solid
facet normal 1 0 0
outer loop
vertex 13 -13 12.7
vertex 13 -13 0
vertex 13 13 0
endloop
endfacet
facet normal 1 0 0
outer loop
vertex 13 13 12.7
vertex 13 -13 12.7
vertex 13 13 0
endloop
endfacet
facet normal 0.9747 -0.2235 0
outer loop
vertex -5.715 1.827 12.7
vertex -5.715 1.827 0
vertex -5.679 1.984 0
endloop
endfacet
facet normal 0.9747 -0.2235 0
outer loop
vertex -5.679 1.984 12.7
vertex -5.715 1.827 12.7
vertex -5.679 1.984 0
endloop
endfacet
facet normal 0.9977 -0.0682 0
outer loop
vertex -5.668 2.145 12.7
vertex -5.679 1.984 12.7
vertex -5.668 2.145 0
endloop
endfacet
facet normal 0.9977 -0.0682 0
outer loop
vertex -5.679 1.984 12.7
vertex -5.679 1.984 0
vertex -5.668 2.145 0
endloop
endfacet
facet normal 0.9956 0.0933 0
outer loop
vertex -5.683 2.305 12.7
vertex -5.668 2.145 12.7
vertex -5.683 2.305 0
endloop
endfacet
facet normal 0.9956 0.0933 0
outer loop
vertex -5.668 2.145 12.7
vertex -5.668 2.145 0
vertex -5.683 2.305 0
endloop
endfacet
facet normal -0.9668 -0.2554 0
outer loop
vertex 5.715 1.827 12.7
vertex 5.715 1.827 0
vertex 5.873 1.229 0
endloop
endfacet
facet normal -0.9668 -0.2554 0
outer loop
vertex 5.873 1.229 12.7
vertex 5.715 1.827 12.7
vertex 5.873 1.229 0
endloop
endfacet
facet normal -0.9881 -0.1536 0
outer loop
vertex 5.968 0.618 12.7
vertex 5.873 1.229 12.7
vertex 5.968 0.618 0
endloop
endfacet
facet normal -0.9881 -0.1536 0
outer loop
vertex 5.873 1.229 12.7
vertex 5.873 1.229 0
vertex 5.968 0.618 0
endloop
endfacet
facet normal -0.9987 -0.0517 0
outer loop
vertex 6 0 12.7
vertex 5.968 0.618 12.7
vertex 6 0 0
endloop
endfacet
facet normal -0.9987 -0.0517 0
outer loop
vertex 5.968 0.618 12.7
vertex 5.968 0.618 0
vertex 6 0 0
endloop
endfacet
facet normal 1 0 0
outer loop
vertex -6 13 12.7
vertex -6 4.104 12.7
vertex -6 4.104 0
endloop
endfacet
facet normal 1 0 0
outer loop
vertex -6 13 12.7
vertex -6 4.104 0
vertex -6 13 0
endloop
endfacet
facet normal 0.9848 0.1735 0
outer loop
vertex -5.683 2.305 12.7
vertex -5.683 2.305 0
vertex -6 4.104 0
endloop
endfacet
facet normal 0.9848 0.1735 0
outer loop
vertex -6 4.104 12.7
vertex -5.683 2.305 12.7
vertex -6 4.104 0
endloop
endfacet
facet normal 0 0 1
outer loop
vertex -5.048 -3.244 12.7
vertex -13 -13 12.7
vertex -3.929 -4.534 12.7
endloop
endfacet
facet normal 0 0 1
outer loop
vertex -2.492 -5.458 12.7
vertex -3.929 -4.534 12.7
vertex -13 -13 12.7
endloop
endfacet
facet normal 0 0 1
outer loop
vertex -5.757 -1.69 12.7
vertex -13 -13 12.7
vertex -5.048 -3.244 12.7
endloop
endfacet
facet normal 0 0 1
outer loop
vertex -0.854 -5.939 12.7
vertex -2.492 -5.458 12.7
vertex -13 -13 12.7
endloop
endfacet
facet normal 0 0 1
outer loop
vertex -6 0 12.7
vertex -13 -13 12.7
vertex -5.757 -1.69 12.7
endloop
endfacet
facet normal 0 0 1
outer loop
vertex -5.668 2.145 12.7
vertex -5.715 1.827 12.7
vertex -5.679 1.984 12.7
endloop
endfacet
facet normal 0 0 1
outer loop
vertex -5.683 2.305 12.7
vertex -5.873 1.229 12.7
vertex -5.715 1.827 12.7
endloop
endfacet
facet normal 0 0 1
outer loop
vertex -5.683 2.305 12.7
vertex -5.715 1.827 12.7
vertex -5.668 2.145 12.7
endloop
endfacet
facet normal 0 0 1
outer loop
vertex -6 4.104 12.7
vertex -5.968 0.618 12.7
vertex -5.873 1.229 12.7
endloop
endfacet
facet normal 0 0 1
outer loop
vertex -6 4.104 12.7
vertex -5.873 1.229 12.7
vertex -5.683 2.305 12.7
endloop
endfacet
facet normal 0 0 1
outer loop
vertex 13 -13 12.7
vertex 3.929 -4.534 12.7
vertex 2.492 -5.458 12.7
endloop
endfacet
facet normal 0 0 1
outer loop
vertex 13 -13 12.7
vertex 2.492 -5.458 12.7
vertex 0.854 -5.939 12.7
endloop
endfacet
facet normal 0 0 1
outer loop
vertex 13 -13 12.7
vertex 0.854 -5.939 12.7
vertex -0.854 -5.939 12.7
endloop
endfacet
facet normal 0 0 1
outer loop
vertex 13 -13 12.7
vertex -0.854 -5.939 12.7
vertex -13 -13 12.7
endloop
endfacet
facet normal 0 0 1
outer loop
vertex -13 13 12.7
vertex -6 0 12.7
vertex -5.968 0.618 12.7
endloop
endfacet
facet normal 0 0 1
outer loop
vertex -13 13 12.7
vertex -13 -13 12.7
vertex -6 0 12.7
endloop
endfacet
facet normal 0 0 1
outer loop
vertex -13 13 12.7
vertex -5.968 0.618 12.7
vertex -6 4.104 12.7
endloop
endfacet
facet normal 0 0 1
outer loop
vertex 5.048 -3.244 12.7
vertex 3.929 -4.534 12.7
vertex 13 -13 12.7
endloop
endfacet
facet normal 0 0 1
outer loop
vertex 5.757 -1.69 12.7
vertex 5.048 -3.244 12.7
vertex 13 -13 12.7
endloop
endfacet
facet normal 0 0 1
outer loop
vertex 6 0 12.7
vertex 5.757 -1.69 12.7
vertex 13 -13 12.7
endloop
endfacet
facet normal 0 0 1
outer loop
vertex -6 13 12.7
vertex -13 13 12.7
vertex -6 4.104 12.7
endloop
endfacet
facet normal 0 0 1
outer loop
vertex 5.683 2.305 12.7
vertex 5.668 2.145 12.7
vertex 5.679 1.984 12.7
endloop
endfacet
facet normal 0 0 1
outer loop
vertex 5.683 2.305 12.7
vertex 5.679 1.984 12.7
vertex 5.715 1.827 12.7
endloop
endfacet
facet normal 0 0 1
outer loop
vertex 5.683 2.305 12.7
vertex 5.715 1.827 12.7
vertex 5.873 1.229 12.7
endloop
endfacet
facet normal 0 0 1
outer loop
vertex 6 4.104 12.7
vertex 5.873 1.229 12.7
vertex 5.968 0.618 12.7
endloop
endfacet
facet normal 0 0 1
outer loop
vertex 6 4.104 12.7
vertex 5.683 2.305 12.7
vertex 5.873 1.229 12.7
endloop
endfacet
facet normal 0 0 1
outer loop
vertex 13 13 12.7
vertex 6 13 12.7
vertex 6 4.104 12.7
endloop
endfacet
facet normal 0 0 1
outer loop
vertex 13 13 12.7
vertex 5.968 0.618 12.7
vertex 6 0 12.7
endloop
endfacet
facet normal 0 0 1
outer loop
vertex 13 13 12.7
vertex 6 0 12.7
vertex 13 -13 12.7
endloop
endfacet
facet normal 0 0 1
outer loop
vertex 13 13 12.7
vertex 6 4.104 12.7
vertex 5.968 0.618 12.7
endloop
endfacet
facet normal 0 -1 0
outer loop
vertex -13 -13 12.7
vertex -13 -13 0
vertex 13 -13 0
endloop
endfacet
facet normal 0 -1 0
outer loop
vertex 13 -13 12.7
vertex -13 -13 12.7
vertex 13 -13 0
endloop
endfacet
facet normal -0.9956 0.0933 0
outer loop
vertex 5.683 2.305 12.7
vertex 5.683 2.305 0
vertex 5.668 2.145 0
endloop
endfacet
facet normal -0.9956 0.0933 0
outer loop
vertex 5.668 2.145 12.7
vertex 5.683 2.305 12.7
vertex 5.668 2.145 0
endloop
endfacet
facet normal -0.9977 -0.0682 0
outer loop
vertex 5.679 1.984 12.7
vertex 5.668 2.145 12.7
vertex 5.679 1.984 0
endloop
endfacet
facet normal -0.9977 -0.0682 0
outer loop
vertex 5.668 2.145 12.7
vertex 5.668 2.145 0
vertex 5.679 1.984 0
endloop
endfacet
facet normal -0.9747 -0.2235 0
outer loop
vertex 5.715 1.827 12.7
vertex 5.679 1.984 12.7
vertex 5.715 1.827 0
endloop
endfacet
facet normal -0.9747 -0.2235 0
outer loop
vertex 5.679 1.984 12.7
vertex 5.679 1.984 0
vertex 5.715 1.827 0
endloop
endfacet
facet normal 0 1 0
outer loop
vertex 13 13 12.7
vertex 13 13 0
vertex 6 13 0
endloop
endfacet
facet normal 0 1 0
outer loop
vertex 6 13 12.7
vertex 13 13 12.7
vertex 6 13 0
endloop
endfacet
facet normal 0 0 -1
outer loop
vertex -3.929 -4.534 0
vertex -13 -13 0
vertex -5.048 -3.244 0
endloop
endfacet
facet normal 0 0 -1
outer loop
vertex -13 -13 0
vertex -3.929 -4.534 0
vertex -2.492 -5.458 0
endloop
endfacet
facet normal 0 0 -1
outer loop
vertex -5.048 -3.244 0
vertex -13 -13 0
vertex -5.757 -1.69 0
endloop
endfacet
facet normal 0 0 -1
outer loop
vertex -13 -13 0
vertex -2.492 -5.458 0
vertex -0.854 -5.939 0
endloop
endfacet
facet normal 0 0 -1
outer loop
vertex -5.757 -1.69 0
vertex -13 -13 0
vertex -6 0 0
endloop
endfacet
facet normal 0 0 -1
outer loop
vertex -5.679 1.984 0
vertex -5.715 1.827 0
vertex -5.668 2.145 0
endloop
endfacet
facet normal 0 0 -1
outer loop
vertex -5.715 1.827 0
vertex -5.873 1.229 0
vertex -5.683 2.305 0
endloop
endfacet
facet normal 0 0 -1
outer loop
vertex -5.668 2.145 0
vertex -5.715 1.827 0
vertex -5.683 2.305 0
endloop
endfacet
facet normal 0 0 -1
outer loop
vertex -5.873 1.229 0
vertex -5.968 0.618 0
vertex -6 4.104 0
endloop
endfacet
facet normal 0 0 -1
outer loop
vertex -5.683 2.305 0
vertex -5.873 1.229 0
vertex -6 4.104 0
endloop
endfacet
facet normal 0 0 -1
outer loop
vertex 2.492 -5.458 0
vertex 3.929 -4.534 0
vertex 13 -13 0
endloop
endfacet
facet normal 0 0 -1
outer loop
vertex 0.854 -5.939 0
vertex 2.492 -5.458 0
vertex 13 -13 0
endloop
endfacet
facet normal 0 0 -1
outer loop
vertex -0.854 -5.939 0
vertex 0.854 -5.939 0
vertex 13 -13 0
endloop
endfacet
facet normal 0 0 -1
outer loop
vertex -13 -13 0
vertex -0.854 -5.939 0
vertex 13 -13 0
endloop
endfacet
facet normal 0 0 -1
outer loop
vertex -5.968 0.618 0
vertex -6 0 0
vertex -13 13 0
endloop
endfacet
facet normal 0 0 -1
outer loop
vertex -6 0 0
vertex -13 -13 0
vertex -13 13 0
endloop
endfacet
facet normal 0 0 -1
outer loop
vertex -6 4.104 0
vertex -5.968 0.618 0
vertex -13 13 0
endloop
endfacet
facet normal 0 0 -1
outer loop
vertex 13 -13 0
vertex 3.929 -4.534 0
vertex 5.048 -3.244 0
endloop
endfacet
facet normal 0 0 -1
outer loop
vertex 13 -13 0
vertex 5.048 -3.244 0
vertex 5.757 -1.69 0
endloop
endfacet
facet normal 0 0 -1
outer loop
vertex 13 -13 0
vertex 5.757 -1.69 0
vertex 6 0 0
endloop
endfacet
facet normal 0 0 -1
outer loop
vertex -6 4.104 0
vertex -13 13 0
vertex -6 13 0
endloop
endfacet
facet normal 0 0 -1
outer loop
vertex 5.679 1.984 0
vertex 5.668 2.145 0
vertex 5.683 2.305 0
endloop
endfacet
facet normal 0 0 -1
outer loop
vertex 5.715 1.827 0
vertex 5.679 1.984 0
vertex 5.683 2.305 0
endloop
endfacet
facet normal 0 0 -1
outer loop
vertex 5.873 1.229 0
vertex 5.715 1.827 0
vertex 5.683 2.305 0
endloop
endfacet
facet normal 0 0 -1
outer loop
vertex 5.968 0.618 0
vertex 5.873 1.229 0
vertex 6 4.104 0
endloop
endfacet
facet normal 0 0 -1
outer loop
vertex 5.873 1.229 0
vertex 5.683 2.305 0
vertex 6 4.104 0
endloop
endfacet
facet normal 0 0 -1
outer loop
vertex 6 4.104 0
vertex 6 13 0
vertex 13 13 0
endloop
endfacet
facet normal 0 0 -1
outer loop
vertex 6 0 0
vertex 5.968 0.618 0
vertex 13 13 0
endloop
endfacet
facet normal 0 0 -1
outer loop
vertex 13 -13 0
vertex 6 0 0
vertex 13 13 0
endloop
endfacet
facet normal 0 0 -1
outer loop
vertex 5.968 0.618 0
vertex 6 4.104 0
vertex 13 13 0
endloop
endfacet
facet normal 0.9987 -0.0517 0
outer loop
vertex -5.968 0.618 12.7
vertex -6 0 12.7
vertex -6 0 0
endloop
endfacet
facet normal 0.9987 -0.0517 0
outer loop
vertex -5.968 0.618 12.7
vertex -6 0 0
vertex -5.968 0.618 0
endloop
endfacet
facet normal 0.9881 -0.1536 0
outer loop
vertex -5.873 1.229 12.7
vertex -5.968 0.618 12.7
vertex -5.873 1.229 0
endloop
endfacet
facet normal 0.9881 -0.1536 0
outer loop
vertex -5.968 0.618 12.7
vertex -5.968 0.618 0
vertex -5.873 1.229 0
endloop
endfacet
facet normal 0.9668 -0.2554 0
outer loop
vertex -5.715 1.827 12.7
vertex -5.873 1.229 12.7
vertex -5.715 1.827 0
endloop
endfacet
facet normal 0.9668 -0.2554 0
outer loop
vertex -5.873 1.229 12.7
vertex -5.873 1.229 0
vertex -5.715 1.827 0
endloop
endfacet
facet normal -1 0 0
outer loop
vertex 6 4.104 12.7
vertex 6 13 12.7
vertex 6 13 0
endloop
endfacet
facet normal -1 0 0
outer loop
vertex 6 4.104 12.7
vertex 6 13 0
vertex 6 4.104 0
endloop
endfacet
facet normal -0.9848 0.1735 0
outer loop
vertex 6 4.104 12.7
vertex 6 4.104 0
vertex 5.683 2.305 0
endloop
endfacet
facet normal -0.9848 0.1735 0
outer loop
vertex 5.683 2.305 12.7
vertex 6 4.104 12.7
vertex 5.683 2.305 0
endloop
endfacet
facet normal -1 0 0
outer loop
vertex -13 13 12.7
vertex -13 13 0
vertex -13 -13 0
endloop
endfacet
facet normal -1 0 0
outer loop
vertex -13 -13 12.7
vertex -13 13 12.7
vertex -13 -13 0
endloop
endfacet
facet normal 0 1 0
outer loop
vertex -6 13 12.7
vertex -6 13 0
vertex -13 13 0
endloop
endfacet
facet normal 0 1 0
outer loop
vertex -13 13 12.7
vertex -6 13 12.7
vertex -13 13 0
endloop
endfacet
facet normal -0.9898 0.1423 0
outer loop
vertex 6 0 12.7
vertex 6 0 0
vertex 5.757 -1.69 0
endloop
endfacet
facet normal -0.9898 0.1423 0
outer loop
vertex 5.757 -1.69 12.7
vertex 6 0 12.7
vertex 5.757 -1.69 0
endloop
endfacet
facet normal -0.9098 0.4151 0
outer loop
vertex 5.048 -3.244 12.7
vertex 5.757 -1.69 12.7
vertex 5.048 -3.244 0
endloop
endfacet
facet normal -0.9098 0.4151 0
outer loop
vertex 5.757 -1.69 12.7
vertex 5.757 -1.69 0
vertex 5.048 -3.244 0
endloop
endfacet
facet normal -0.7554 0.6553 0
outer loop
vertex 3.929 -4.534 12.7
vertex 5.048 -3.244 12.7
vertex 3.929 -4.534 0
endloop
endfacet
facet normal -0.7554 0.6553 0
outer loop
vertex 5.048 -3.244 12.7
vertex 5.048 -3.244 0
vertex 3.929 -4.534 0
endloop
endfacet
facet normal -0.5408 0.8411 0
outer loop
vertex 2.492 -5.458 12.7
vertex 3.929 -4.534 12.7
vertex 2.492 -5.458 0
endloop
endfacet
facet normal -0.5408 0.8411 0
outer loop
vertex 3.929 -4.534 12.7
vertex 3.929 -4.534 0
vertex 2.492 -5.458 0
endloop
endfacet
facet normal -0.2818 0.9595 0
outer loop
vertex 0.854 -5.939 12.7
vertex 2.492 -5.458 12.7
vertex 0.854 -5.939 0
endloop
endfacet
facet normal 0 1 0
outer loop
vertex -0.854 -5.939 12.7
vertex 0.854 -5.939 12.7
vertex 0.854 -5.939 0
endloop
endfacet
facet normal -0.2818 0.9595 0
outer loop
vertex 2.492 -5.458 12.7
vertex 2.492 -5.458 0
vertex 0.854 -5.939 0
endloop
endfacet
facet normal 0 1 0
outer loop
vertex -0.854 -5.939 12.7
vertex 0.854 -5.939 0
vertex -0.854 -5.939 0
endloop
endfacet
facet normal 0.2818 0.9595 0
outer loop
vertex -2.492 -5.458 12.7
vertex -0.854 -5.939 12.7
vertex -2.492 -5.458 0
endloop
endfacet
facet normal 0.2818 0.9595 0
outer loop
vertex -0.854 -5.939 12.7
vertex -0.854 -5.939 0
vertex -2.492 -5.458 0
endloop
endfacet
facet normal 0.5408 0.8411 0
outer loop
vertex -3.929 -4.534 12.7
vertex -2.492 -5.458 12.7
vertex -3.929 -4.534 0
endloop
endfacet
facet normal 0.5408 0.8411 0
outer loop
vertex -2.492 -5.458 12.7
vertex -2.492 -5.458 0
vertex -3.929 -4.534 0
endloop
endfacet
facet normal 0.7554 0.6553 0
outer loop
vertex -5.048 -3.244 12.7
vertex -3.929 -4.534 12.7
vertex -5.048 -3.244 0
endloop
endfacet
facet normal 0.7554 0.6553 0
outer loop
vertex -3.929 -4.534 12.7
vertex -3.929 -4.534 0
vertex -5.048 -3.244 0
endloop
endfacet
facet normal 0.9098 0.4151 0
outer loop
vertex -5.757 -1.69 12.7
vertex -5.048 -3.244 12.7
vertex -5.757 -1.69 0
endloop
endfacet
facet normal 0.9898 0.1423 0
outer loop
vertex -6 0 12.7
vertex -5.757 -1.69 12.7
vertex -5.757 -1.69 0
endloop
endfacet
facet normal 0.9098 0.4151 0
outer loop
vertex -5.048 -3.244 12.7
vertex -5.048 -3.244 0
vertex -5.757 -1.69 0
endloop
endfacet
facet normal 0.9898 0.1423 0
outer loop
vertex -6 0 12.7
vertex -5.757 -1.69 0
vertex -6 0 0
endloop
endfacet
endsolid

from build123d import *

# Parameters (mm, degrees)
F1_DEPTH = 12.7


# Not quite as in the source:
# - a length typed as a fraction of an inch, garbled in the dataset ("3 / 203.2 mm" for 3/8 in), is restored


with BuildPart() as f1:
    # F0 (on Top) → F1 (new body)
    with BuildSketch(Plane.XY):
        with BuildLine():
            Line((-6, 13), (-13, 13))
            Line((-13, 13), (-13, -13))
            Line((-13, -13), (13, -13))
            Line((13, -13), (13, 13))
            Line((13, 13), (6, 13))
            Line((6, 13), (6, 4.1042417199))
            Line((6, 4.1042417199), (5.6827738736, 2.3051629565))
            ThreePointArc((5.6827738736, 2.3051629565), (5.6698549343, 2.0641245171), (5.7150699657, 1.8270126676))
            ThreePointArc((5.7150699657, 1.8270126676), (5.9283395565, 0.9245485942), (6, 0))
            ThreePointArc((6, 0), (0, -6), (-6, 0))
            ThreePointArc((-6, 0), (-5.9283395565, 0.9245485942), (-5.7150699657, 1.8270126676))
            ThreePointArc((-5.7150699657, 1.8270126676), (-5.6698549343, 2.0641245171), (-5.6827738736, 2.3051629565))
            Line((-5.6827738736, 2.3051629565), (-6, 4.1042417199))
            Line((-6, 4.1042417199), (-6, 13))
        make_face()
    extrude(amount=F1_DEPTH)


solid = f1.part
